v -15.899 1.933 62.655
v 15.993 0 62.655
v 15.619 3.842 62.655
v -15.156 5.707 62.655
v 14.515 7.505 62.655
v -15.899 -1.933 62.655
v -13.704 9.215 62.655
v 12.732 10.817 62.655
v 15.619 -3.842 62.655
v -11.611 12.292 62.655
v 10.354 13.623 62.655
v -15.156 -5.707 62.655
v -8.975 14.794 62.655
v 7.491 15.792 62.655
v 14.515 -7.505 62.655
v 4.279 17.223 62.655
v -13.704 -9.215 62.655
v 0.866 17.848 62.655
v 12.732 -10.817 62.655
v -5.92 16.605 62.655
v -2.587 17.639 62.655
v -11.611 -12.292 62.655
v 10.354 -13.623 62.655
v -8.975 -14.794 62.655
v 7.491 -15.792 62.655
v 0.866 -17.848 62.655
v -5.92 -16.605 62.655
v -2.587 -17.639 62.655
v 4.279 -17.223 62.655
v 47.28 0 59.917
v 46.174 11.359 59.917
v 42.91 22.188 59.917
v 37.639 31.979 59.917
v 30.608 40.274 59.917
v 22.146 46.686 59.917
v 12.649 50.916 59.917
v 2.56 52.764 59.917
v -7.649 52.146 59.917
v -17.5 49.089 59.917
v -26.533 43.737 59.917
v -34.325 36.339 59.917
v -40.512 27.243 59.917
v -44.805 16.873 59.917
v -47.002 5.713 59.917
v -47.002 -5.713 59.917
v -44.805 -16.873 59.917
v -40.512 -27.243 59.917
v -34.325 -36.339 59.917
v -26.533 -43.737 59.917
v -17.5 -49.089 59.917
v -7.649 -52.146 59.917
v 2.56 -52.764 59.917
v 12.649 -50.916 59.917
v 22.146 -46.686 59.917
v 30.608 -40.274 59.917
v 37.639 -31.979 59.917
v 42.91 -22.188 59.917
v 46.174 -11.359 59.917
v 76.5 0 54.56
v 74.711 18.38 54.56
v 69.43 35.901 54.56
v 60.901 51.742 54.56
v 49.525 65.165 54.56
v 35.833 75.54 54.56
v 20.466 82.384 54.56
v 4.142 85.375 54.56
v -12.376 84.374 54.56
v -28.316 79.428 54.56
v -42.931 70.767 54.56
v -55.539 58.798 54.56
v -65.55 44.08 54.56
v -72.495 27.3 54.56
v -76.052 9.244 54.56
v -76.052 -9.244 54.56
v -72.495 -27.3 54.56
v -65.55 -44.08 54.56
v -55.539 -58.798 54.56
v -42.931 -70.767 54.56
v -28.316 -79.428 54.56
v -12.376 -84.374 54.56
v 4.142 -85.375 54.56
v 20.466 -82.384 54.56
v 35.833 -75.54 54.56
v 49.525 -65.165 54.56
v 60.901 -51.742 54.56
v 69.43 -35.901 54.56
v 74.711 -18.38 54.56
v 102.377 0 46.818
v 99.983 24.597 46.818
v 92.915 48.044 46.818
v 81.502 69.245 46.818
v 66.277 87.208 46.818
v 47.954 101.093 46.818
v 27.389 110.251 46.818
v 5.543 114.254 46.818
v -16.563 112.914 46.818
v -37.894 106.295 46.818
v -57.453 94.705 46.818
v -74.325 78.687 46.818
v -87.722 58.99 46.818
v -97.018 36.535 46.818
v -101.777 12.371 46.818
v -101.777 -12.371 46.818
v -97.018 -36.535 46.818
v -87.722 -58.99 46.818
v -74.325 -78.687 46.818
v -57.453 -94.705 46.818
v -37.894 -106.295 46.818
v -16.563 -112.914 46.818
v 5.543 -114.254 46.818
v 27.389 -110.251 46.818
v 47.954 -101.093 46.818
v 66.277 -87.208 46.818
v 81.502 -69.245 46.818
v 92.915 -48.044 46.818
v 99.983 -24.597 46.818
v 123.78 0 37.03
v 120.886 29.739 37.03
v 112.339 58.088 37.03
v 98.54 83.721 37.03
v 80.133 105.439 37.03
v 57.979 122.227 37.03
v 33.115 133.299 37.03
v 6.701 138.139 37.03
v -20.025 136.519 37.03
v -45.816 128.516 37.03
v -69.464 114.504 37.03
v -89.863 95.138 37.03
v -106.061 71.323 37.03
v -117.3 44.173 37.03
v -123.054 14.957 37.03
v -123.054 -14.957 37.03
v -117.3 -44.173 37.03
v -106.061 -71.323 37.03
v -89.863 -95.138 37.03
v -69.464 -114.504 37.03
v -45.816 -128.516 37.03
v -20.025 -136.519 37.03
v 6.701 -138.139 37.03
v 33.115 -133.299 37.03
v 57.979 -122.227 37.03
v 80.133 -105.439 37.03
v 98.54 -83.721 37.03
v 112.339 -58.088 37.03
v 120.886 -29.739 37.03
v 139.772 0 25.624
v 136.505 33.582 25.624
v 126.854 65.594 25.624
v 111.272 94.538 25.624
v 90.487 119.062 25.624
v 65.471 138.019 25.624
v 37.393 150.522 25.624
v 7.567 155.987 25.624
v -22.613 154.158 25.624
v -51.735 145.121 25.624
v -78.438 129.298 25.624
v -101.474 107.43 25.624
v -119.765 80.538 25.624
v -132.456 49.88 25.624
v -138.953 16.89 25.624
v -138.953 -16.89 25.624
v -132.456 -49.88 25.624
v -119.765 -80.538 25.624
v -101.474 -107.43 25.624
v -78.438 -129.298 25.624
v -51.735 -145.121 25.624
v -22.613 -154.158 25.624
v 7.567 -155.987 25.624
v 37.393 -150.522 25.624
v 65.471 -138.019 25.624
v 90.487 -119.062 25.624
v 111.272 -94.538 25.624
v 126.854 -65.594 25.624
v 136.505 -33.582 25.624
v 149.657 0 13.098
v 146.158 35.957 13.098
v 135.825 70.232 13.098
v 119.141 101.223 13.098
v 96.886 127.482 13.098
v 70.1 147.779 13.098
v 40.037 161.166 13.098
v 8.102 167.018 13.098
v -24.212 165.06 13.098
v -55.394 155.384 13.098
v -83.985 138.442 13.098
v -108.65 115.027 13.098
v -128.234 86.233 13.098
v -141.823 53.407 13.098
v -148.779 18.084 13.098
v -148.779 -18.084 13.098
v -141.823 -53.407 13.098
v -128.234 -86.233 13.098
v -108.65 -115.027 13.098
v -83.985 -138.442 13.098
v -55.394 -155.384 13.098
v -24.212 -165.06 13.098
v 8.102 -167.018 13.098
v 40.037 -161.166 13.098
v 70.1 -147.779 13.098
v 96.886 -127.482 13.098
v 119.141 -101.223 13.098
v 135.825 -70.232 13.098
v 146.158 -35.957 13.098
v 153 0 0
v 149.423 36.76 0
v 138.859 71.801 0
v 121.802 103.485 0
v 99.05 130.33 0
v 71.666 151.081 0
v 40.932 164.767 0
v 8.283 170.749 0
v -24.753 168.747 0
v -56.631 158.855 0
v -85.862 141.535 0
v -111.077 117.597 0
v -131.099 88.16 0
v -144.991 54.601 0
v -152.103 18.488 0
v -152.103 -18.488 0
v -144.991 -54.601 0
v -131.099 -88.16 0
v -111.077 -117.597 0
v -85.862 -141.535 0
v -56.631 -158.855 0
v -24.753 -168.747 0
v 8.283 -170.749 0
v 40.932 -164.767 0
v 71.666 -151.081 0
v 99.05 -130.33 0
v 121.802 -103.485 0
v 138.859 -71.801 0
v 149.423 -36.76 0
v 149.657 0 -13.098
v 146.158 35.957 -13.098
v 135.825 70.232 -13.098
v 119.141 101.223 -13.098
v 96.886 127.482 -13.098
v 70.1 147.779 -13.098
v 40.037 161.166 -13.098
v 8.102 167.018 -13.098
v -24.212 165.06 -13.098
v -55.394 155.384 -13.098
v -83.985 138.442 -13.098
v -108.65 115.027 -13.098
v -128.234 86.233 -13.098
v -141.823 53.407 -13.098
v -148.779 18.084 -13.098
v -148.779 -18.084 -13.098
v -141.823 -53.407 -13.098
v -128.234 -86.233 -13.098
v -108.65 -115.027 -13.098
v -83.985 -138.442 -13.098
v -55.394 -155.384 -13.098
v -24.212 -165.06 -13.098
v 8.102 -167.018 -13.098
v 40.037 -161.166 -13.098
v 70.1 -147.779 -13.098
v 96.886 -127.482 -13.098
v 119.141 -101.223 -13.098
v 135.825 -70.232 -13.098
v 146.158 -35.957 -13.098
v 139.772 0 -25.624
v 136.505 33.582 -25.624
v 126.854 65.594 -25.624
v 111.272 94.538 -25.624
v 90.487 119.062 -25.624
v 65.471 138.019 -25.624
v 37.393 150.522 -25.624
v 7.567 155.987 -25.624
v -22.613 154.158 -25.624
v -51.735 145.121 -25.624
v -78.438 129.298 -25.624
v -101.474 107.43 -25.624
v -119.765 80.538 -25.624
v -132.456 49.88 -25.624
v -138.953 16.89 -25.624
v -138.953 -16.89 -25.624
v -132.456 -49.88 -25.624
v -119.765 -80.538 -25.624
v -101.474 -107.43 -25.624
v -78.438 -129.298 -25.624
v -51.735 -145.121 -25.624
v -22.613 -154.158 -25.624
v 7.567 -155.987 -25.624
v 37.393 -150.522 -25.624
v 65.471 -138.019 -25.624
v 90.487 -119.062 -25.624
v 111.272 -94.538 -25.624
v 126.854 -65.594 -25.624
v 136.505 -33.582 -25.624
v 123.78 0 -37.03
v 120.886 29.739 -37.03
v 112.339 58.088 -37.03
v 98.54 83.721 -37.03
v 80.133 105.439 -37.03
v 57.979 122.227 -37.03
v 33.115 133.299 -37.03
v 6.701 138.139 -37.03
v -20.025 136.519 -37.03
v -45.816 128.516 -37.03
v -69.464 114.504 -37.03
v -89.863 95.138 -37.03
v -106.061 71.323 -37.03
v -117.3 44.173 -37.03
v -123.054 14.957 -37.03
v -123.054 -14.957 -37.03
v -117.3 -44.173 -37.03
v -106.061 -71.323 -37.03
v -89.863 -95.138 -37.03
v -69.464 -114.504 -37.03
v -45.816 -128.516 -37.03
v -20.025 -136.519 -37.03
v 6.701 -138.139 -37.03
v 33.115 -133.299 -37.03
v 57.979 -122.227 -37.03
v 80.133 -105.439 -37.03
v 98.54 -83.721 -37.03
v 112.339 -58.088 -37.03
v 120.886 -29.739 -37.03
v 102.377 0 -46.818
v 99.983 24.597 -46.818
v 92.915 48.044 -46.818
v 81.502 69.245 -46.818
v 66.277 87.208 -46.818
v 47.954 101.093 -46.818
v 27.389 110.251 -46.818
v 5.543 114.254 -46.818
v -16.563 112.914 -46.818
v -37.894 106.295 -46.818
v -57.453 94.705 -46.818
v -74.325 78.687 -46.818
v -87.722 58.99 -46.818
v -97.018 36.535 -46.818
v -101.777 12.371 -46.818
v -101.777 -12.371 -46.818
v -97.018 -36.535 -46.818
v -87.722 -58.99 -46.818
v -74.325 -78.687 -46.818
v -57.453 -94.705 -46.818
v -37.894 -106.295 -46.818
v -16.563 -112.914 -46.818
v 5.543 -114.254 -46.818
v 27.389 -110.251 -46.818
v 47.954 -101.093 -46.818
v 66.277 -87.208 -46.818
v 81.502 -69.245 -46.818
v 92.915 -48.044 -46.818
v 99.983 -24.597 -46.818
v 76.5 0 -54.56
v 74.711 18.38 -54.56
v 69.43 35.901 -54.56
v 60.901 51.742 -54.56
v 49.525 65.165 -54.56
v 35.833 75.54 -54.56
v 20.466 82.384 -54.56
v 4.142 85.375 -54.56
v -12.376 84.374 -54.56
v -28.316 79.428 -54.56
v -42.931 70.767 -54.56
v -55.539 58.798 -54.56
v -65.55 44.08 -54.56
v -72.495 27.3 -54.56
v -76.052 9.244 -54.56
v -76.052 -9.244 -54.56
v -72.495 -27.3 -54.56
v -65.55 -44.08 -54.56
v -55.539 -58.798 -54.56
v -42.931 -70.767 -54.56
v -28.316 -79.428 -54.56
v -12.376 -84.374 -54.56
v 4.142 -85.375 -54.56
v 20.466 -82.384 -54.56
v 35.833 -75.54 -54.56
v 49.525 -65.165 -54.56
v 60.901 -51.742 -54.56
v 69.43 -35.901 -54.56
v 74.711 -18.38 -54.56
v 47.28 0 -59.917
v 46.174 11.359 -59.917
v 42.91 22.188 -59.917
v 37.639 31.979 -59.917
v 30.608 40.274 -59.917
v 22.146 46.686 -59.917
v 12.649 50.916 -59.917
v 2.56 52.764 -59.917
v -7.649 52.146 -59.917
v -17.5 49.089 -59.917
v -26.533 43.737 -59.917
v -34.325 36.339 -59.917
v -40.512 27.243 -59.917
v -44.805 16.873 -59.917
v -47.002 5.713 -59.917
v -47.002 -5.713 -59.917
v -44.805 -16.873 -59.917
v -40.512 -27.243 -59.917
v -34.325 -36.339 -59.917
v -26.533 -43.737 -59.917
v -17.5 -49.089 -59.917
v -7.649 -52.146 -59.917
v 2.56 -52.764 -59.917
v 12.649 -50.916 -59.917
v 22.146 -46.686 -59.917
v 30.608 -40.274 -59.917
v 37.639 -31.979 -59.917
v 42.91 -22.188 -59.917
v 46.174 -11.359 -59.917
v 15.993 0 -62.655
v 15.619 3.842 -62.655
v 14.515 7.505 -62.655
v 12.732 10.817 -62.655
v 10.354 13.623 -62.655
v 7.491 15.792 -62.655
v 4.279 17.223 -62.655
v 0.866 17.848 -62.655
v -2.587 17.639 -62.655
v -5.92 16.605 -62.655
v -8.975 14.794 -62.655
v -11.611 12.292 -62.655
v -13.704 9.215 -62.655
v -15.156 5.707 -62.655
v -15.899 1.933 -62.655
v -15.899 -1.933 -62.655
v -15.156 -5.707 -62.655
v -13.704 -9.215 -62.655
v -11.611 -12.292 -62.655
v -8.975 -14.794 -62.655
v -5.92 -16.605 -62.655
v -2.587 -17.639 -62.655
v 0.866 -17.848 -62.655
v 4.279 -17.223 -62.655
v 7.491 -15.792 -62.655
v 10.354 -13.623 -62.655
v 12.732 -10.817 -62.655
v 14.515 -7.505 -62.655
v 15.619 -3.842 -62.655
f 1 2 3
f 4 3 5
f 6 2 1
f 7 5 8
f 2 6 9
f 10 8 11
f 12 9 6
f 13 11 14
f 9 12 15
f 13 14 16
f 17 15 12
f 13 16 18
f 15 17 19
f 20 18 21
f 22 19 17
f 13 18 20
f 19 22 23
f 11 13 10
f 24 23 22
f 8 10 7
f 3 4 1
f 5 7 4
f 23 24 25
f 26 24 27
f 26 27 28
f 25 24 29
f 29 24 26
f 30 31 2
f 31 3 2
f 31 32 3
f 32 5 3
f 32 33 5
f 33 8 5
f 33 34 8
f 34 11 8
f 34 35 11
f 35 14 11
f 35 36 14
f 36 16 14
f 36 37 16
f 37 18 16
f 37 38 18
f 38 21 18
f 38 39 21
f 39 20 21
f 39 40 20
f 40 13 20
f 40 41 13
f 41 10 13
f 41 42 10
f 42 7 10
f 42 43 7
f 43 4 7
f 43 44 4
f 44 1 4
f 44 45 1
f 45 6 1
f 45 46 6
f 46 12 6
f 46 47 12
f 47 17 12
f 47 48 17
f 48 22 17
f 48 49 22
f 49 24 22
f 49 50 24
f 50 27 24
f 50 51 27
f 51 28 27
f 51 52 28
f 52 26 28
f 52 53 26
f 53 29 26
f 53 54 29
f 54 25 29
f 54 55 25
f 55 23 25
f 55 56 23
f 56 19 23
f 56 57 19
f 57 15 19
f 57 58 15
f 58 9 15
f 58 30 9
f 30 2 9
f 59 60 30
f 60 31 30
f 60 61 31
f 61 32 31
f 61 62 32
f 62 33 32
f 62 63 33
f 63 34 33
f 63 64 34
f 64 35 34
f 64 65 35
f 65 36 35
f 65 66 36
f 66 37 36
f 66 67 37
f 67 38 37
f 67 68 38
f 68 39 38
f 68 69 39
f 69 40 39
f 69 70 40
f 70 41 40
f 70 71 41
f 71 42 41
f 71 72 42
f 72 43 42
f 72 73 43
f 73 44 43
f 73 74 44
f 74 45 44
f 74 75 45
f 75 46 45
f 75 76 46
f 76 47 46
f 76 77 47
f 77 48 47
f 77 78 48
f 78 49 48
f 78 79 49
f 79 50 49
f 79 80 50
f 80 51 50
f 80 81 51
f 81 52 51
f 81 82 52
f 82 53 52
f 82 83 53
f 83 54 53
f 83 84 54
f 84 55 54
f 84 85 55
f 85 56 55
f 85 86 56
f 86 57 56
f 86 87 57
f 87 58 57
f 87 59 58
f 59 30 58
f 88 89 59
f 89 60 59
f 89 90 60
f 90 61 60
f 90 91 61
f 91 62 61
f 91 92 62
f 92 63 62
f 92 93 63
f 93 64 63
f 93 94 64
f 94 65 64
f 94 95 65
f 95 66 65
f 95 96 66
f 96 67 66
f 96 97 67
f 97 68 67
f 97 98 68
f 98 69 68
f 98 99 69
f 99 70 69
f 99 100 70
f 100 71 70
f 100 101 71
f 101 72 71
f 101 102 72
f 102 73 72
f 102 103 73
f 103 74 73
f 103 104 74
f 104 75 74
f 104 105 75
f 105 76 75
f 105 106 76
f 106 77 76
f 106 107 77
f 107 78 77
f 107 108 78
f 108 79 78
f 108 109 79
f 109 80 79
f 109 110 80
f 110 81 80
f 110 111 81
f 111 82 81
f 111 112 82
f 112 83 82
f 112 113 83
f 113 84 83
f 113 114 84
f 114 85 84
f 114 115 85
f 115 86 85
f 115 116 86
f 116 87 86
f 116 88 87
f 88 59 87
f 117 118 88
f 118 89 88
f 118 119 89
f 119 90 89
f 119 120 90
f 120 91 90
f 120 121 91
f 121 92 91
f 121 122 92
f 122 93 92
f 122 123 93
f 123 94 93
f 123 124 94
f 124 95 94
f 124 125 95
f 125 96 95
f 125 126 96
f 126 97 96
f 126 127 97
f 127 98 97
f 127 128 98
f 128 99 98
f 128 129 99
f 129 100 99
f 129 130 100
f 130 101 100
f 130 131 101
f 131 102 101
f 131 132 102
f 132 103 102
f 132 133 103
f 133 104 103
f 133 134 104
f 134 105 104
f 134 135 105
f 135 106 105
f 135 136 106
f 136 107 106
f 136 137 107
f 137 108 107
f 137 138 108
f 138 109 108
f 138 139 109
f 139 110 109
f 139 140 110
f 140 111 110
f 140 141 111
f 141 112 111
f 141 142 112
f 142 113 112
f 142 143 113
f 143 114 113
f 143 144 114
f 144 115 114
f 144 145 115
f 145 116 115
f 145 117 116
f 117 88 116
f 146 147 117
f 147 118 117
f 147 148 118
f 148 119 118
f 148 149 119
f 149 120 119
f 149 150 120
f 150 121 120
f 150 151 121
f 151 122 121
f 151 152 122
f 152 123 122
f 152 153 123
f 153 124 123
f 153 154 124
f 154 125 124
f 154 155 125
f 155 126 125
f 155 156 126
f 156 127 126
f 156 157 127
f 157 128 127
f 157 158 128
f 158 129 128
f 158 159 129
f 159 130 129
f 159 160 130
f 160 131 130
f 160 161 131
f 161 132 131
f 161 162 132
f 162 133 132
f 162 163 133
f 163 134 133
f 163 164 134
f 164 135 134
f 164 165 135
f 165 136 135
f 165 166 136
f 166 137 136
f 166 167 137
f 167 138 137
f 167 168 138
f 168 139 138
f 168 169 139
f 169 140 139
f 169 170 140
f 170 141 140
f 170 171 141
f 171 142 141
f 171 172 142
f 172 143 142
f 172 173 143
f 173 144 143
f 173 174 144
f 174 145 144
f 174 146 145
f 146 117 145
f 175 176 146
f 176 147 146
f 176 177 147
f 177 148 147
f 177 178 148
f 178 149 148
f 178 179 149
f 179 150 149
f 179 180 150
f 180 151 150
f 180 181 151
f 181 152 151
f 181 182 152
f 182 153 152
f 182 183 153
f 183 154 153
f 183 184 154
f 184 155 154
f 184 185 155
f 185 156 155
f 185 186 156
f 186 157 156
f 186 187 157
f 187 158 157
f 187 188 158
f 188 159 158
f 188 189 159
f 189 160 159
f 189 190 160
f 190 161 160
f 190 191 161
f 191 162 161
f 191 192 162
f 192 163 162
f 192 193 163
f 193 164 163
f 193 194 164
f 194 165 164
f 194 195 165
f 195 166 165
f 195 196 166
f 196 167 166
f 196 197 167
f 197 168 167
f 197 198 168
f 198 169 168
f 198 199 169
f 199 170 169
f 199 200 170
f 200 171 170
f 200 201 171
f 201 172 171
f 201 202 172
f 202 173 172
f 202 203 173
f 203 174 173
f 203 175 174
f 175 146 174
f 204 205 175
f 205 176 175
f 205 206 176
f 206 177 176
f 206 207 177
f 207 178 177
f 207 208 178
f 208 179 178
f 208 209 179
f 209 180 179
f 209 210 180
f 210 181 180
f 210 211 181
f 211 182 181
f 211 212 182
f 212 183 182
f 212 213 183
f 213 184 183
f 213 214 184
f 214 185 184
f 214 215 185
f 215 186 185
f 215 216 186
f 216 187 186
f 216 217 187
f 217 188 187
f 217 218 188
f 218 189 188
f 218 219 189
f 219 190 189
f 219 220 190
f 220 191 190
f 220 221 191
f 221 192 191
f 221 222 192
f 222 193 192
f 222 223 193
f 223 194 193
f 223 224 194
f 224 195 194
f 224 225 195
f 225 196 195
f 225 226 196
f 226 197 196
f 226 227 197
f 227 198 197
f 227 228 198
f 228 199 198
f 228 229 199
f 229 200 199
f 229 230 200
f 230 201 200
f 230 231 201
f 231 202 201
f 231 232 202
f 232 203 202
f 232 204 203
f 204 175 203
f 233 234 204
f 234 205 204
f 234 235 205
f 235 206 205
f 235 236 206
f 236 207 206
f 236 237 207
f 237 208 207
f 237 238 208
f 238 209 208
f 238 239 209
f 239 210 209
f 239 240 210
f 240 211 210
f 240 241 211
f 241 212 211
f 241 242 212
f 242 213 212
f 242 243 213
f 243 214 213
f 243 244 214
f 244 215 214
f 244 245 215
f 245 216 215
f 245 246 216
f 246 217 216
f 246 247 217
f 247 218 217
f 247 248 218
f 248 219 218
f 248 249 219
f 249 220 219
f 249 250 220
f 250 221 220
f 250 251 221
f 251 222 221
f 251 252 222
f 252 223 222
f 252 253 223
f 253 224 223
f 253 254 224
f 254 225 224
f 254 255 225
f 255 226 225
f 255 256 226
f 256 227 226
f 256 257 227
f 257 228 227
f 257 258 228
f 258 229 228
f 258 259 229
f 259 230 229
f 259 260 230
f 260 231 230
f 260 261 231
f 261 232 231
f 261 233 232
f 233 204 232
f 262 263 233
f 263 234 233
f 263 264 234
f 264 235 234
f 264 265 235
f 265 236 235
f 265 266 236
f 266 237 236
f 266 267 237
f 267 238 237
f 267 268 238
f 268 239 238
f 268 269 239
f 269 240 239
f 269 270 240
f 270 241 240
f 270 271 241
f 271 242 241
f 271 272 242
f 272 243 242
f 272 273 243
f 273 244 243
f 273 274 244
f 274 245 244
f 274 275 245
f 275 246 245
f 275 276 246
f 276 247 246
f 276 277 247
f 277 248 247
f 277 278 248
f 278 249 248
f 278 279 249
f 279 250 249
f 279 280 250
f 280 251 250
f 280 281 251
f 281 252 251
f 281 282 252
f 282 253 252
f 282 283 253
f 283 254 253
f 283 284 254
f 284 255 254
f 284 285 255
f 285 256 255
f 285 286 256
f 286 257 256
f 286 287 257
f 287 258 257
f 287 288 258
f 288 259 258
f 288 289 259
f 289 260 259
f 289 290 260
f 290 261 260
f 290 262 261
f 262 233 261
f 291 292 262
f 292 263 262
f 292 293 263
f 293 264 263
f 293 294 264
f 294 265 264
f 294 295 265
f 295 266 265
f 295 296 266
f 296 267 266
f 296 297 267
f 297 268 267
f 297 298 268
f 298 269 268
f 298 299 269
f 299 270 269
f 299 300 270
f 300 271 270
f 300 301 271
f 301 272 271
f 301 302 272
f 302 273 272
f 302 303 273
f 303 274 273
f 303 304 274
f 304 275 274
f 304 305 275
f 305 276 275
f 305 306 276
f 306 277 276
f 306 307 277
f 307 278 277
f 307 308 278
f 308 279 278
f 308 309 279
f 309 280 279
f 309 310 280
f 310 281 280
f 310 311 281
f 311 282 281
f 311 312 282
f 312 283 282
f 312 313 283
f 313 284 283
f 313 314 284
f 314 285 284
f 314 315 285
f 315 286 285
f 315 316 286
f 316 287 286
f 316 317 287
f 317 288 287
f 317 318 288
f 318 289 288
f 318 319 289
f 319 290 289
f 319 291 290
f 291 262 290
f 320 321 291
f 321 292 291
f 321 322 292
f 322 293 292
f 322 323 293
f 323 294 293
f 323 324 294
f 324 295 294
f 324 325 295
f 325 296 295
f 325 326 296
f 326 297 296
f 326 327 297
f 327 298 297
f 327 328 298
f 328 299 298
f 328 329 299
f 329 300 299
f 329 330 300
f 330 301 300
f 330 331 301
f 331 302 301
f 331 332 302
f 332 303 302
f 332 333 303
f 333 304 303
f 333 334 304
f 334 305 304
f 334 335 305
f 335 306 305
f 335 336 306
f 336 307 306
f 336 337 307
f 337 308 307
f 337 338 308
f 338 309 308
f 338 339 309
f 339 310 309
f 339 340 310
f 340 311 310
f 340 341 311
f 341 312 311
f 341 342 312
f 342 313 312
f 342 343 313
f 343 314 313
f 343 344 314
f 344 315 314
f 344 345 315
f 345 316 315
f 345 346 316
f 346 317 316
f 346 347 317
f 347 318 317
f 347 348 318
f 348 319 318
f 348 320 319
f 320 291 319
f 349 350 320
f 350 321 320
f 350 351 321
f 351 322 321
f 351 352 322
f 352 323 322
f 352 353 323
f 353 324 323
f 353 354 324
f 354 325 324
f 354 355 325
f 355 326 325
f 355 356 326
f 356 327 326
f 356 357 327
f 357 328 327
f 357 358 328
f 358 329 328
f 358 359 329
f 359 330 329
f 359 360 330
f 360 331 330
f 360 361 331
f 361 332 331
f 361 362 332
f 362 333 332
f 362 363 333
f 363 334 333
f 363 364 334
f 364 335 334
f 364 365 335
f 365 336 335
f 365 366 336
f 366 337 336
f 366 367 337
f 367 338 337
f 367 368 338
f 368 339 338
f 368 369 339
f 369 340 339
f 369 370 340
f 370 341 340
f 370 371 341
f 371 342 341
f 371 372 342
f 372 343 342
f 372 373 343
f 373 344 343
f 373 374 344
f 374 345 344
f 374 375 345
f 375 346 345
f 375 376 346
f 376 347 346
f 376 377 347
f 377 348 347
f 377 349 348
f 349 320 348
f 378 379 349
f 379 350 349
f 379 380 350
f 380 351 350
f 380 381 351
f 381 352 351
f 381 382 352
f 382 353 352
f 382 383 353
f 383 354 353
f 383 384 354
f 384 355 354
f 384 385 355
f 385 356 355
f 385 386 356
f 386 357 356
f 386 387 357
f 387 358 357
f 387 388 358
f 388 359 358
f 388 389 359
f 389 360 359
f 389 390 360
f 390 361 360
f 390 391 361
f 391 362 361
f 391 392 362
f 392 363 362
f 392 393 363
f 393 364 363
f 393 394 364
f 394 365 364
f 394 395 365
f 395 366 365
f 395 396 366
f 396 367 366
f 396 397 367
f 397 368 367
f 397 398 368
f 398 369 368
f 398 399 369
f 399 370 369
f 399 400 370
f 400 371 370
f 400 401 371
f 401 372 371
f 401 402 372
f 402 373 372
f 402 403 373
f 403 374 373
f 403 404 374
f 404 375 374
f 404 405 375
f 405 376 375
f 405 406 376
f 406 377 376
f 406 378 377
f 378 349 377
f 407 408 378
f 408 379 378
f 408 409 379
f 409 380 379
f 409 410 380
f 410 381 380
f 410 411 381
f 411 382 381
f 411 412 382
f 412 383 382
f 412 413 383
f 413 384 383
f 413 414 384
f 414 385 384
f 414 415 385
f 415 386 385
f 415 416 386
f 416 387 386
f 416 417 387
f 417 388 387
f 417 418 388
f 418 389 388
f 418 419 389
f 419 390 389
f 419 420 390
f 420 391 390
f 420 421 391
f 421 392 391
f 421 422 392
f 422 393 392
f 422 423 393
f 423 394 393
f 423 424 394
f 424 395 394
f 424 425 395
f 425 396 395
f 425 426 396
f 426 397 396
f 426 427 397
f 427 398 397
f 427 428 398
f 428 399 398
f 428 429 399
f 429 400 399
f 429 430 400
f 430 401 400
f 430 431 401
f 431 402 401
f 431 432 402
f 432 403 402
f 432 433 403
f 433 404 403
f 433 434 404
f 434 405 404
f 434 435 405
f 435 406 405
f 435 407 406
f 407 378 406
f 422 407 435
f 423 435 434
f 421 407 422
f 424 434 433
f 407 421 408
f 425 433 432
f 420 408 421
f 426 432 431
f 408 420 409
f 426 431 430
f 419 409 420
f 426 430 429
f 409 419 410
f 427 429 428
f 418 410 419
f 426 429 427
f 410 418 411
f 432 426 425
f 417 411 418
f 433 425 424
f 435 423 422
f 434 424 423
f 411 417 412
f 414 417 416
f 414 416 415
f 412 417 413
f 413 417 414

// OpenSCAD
// Generated by SolidPython 1.0.1 on 2020-07-29 00:46:53


scale(v = [17, 19, 7]) {
	sphere(r = 9);
}
/***********************************************
*********      SolidPython code:      **********
************************************************
 
# import packages: SolidPython
from solid import *
from solid.utils import *
from itertools import chain, combinations, permutations


class Resize:

    def __init__(self, scad_file):
        self.scad_file = scad_file
        #self.scad_file = import_scad(scad_file)
        # cone/cylinder param:
        self.r1 = 0
        self.r2 = 0
        self.h = 0
        # rectangular prism param:
        self.w = 0
        self.l = 0
        # ellipse param:
        self.r = 0

    # import OpenScad code (file name corresponds to shape)


    # classify shape + parameters
    def assign(self, param1, param2, param3):
        if self.scad_file == 'cone.scad':
            self.r1 = param1
            self.r2 = param2
            self.h = param3
        elif self.scad_file == 'cylinder.scad':
            self.r1 = param1
            self.r2 = param2
            self.h = param3
        elif self.scad_file == 'rectangularPrism.scad':
            self.h = param1
            self.l = param2
            self.w = param3
        else:
            self.r = param1
            self.h = param2

    # resize parameters
    def iterate(self):
        x = range(3, 20, 2)
        i = 1
        if self.scad_file == 'cone.scad':
            tempList = list(permutations(x, 2))
            for temp in tempList:
                param1 = temp[0]
                param2 = temp[1]
                filepath = 'produced_scad_files/' + 'cone' + str(param1) + '_' + str(param2) + '_' + '.scad'
                scad_render_to_file(cylinder(h=param1, r1=param2, r2=0), filepath)

        elif self.scad_file == 'cylinder.scad':
            tempList = list(permutations(x, 3))
            for temp in tempList:
                param1 = temp[0]
                param2 = temp[1]
                filepath = 'produced_scad_files/' + 'cylinder' + str(param1) + '_' + str(param2) + '_' + '.scad'
                scad_render_to_file(cylinder(h=param1, r1=param2, r2=param2), filepath)

        elif self.scad_file == 'rectangularPrism.scad':
            tempList = list(permutations(x, 3))
            for temp in tempList:
                param1 = temp[0]
                param2 = temp[1]
                param3 = temp[2]
                filepath = 'produced_scad_files/' + 'rectangularPrism' + str(param1) + '_' + str(param2) + '_' + str(
                    param3) + '.scad'
                scad_render_to_file(cube(size=(param1, param2, param3)), filepath)

        elif self.scad_file == 'ellipse.scad':
            tempList = list(permutations(x, 4))
            for temp in tempList:
                param1 = temp[0]
                param2 = temp[1]
                param3 = temp[2]
                param4 = temp[3]
                filepath = 'produced_scad_files/' + 'ellipse' + str(param1) + '_' + str(param2) + '_' + str(param3) + '_' + str(param4) + '.scad'
                scad_render_to_file(scale([param1, param2, param3])(sphere(r=param4)), filepath)

    def render_to_scadfile(self):
        scad_render_to_file(scad, 'example.scad') 
 
************************************************/
